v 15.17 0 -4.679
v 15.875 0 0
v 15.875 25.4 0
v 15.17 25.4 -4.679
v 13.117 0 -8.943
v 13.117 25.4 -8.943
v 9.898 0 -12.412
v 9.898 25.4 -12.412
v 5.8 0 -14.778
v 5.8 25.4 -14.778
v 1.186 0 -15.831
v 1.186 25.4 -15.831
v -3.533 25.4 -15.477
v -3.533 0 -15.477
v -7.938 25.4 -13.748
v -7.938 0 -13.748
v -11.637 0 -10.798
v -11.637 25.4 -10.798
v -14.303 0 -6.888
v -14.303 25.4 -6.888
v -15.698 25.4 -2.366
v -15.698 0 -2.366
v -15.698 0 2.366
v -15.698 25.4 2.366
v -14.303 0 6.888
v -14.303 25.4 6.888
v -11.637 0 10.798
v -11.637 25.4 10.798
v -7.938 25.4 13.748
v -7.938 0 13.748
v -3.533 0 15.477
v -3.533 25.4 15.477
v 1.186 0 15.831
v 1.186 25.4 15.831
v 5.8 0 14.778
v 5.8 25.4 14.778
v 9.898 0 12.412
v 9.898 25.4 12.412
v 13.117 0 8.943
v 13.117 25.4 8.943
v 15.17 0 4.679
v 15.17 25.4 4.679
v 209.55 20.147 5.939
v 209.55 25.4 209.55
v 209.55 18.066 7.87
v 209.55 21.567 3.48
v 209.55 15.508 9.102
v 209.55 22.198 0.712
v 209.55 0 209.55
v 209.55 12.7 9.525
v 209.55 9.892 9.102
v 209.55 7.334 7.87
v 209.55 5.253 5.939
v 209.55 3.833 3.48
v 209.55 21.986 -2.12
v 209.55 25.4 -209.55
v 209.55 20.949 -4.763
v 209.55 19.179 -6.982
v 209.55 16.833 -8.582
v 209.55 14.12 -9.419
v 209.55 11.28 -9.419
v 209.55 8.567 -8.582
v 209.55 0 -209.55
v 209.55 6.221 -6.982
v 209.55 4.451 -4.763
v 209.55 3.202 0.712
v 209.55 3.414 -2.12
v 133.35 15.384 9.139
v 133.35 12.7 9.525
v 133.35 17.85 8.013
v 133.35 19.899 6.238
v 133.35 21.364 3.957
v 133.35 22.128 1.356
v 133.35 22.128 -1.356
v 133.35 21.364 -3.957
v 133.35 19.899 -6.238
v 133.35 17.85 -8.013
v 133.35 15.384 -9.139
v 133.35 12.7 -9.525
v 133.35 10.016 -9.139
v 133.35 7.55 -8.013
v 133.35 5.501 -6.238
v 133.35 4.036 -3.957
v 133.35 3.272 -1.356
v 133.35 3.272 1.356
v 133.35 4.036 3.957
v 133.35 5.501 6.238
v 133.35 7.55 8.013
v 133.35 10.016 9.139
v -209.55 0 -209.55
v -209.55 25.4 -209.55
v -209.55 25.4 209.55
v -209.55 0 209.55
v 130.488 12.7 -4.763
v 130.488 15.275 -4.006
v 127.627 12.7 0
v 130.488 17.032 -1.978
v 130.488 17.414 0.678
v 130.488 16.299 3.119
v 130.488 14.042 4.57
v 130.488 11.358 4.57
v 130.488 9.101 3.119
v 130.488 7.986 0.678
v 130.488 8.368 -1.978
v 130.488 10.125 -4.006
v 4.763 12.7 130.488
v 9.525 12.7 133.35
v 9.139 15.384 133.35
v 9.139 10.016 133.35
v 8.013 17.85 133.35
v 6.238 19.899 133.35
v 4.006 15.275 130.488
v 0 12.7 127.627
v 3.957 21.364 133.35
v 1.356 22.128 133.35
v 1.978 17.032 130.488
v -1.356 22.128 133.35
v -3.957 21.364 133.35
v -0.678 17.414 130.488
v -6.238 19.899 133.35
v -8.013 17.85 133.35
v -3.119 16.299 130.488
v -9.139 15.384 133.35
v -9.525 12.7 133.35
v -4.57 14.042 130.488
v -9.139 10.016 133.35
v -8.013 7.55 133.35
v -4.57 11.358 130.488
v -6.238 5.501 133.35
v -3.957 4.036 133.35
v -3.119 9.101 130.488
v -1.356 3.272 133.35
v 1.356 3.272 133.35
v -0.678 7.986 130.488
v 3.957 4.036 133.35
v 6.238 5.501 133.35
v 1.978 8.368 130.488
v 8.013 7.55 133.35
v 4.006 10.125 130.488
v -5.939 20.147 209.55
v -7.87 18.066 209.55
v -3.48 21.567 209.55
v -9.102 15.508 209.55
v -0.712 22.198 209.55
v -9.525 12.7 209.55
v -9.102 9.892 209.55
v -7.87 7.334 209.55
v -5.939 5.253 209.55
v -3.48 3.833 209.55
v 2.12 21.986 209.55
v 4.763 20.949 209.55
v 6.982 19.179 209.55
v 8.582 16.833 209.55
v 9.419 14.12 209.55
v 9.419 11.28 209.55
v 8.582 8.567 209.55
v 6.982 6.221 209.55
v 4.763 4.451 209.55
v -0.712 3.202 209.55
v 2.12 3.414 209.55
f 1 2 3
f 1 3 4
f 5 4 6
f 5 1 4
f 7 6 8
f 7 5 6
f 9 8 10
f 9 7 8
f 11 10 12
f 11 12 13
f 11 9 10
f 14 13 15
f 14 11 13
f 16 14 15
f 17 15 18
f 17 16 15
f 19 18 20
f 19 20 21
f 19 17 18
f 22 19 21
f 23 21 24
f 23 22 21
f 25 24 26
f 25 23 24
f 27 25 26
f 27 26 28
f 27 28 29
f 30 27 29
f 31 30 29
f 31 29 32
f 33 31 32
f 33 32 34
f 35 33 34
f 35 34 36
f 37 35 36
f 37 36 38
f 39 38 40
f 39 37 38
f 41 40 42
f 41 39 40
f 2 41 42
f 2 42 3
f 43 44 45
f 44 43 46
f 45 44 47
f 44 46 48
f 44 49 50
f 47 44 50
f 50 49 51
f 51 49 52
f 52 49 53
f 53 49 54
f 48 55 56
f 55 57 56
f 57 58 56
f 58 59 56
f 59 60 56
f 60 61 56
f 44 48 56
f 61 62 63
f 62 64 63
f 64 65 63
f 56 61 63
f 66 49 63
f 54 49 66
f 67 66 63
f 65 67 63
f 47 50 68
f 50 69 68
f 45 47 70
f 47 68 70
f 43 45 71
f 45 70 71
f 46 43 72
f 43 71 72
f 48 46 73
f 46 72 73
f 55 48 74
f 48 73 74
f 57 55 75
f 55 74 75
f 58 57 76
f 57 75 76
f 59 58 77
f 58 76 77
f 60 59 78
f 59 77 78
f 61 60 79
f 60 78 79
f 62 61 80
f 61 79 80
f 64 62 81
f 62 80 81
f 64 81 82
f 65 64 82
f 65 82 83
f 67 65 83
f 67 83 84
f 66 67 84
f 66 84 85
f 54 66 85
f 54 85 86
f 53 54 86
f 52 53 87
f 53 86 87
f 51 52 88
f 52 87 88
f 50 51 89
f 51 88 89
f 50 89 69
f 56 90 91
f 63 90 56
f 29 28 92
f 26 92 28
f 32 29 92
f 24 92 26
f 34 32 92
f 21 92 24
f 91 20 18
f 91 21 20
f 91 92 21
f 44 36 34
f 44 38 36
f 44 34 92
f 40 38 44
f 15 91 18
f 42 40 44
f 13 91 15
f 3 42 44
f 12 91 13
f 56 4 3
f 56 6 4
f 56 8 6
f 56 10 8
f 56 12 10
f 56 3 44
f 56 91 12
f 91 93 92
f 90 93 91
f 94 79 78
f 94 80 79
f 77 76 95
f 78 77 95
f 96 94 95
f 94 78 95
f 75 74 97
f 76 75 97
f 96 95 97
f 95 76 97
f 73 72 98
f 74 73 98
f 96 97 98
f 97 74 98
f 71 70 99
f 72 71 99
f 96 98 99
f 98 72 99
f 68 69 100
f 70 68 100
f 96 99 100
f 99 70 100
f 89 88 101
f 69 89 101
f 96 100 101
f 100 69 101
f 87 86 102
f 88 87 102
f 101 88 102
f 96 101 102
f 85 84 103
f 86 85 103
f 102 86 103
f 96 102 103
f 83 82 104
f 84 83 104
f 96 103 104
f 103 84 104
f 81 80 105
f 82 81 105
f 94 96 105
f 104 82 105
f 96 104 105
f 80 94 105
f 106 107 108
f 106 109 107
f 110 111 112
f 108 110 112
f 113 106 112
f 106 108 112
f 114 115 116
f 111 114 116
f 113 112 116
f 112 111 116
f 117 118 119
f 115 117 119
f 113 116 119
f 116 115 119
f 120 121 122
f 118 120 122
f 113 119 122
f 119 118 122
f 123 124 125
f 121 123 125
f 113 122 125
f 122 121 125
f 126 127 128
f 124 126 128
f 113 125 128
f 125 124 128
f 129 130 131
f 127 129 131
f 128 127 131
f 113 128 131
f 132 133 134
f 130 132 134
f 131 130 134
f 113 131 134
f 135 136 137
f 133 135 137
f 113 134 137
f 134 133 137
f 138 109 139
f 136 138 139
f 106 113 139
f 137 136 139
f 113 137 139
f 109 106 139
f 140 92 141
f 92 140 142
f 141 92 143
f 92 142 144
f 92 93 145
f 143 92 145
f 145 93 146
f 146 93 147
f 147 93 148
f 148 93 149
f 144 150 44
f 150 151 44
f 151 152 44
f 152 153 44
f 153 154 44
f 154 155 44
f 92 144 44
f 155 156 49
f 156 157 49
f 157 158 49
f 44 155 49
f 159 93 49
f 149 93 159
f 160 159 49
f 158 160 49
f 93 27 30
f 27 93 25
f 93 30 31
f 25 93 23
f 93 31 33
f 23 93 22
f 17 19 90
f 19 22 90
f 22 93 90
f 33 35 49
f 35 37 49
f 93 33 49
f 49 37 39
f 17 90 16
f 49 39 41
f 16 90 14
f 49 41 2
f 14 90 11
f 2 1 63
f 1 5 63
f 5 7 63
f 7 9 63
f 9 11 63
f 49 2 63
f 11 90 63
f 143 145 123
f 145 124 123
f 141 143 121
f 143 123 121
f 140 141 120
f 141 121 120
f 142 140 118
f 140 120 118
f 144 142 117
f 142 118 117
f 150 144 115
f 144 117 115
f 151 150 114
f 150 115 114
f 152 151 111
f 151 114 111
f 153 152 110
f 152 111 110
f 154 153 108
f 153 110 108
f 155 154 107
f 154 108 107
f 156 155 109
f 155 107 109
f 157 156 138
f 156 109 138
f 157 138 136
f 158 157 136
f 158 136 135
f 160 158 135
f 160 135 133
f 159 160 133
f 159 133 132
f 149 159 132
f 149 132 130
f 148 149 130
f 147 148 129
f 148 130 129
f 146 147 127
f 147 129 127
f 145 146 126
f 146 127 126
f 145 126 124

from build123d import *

# Parameters (mm, degrees)
SKETCH1_W                       = 419.1
SKETCH1_H                       = 419.1
SKETCH1_R                       = 15.875
BOSS_EXTRUDE1_DEPTH             = 25.4
F_3_4_0_75_DIAMETER_HOLE2_D     = 19.05
F_3_4_0_75_DIAMETER_HOLE2_DEPTH = 76.2
F_3_4_0_75_DIAMETER_HOLE2_TIP   = 5.723197396
F_3_4_0_75_DIAMETER_HOLE1_D     = 19.05
F_3_4_0_75_DIAMETER_HOLE1_DEPTH = 76.2
F_3_4_0_75_DIAMETER_HOLE1_TIP   = 5.723197396


with BuildPart() as part:
    # Sketch1 → Boss-Extrude1 (new body)
    with BuildSketch(Plane(origin=(0, 0, 0), x_dir=(1, 0, 0), z_dir=(0, 1, 0))):
        Rectangle(SKETCH1_W, SKETCH1_H)
        Circle(SKETCH1_R, mode=Mode.SUBTRACT)
    extrude(amount=BOSS_EXTRUDE1_DEPTH)

    # 3/4 (0.75) Diameter Hole2
    with Locations(Plane(origin=(209.55, 0, 0), x_dir=(0, 0, -1), z_dir=(1, 0, 0))):
        with Locations((0, 12.7)):
            Hole(F_3_4_0_75_DIAMETER_HOLE2_D / 2, depth=F_3_4_0_75_DIAMETER_HOLE2_DEPTH)
            with Locations((0, 0, -(F_3_4_0_75_DIAMETER_HOLE2_DEPTH + F_3_4_0_75_DIAMETER_HOLE2_TIP / 2))):  # 118° drill point
                Cone(0, F_3_4_0_75_DIAMETER_HOLE2_D / 2, F_3_4_0_75_DIAMETER_HOLE2_TIP, mode=Mode.SUBTRACT)

    # 3/4 (0.75) Diameter Hole1
    with Locations(Plane.XY.offset(209.55)):
        with Locations((0, 12.7)):
            Hole(F_3_4_0_75_DIAMETER_HOLE1_D / 2, depth=F_3_4_0_75_DIAMETER_HOLE1_DEPTH)
            with Locations((0, 0, -(F_3_4_0_75_DIAMETER_HOLE1_DEPTH + F_3_4_0_75_DIAMETER_HOLE1_TIP / 2))):  # 118° drill point
                Cone(0, F_3_4_0_75_DIAMETER_HOLE1_D / 2, F_3_4_0_75_DIAMETER_HOLE1_TIP, mode=Mode.SUBTRACT)


solid = part.part
